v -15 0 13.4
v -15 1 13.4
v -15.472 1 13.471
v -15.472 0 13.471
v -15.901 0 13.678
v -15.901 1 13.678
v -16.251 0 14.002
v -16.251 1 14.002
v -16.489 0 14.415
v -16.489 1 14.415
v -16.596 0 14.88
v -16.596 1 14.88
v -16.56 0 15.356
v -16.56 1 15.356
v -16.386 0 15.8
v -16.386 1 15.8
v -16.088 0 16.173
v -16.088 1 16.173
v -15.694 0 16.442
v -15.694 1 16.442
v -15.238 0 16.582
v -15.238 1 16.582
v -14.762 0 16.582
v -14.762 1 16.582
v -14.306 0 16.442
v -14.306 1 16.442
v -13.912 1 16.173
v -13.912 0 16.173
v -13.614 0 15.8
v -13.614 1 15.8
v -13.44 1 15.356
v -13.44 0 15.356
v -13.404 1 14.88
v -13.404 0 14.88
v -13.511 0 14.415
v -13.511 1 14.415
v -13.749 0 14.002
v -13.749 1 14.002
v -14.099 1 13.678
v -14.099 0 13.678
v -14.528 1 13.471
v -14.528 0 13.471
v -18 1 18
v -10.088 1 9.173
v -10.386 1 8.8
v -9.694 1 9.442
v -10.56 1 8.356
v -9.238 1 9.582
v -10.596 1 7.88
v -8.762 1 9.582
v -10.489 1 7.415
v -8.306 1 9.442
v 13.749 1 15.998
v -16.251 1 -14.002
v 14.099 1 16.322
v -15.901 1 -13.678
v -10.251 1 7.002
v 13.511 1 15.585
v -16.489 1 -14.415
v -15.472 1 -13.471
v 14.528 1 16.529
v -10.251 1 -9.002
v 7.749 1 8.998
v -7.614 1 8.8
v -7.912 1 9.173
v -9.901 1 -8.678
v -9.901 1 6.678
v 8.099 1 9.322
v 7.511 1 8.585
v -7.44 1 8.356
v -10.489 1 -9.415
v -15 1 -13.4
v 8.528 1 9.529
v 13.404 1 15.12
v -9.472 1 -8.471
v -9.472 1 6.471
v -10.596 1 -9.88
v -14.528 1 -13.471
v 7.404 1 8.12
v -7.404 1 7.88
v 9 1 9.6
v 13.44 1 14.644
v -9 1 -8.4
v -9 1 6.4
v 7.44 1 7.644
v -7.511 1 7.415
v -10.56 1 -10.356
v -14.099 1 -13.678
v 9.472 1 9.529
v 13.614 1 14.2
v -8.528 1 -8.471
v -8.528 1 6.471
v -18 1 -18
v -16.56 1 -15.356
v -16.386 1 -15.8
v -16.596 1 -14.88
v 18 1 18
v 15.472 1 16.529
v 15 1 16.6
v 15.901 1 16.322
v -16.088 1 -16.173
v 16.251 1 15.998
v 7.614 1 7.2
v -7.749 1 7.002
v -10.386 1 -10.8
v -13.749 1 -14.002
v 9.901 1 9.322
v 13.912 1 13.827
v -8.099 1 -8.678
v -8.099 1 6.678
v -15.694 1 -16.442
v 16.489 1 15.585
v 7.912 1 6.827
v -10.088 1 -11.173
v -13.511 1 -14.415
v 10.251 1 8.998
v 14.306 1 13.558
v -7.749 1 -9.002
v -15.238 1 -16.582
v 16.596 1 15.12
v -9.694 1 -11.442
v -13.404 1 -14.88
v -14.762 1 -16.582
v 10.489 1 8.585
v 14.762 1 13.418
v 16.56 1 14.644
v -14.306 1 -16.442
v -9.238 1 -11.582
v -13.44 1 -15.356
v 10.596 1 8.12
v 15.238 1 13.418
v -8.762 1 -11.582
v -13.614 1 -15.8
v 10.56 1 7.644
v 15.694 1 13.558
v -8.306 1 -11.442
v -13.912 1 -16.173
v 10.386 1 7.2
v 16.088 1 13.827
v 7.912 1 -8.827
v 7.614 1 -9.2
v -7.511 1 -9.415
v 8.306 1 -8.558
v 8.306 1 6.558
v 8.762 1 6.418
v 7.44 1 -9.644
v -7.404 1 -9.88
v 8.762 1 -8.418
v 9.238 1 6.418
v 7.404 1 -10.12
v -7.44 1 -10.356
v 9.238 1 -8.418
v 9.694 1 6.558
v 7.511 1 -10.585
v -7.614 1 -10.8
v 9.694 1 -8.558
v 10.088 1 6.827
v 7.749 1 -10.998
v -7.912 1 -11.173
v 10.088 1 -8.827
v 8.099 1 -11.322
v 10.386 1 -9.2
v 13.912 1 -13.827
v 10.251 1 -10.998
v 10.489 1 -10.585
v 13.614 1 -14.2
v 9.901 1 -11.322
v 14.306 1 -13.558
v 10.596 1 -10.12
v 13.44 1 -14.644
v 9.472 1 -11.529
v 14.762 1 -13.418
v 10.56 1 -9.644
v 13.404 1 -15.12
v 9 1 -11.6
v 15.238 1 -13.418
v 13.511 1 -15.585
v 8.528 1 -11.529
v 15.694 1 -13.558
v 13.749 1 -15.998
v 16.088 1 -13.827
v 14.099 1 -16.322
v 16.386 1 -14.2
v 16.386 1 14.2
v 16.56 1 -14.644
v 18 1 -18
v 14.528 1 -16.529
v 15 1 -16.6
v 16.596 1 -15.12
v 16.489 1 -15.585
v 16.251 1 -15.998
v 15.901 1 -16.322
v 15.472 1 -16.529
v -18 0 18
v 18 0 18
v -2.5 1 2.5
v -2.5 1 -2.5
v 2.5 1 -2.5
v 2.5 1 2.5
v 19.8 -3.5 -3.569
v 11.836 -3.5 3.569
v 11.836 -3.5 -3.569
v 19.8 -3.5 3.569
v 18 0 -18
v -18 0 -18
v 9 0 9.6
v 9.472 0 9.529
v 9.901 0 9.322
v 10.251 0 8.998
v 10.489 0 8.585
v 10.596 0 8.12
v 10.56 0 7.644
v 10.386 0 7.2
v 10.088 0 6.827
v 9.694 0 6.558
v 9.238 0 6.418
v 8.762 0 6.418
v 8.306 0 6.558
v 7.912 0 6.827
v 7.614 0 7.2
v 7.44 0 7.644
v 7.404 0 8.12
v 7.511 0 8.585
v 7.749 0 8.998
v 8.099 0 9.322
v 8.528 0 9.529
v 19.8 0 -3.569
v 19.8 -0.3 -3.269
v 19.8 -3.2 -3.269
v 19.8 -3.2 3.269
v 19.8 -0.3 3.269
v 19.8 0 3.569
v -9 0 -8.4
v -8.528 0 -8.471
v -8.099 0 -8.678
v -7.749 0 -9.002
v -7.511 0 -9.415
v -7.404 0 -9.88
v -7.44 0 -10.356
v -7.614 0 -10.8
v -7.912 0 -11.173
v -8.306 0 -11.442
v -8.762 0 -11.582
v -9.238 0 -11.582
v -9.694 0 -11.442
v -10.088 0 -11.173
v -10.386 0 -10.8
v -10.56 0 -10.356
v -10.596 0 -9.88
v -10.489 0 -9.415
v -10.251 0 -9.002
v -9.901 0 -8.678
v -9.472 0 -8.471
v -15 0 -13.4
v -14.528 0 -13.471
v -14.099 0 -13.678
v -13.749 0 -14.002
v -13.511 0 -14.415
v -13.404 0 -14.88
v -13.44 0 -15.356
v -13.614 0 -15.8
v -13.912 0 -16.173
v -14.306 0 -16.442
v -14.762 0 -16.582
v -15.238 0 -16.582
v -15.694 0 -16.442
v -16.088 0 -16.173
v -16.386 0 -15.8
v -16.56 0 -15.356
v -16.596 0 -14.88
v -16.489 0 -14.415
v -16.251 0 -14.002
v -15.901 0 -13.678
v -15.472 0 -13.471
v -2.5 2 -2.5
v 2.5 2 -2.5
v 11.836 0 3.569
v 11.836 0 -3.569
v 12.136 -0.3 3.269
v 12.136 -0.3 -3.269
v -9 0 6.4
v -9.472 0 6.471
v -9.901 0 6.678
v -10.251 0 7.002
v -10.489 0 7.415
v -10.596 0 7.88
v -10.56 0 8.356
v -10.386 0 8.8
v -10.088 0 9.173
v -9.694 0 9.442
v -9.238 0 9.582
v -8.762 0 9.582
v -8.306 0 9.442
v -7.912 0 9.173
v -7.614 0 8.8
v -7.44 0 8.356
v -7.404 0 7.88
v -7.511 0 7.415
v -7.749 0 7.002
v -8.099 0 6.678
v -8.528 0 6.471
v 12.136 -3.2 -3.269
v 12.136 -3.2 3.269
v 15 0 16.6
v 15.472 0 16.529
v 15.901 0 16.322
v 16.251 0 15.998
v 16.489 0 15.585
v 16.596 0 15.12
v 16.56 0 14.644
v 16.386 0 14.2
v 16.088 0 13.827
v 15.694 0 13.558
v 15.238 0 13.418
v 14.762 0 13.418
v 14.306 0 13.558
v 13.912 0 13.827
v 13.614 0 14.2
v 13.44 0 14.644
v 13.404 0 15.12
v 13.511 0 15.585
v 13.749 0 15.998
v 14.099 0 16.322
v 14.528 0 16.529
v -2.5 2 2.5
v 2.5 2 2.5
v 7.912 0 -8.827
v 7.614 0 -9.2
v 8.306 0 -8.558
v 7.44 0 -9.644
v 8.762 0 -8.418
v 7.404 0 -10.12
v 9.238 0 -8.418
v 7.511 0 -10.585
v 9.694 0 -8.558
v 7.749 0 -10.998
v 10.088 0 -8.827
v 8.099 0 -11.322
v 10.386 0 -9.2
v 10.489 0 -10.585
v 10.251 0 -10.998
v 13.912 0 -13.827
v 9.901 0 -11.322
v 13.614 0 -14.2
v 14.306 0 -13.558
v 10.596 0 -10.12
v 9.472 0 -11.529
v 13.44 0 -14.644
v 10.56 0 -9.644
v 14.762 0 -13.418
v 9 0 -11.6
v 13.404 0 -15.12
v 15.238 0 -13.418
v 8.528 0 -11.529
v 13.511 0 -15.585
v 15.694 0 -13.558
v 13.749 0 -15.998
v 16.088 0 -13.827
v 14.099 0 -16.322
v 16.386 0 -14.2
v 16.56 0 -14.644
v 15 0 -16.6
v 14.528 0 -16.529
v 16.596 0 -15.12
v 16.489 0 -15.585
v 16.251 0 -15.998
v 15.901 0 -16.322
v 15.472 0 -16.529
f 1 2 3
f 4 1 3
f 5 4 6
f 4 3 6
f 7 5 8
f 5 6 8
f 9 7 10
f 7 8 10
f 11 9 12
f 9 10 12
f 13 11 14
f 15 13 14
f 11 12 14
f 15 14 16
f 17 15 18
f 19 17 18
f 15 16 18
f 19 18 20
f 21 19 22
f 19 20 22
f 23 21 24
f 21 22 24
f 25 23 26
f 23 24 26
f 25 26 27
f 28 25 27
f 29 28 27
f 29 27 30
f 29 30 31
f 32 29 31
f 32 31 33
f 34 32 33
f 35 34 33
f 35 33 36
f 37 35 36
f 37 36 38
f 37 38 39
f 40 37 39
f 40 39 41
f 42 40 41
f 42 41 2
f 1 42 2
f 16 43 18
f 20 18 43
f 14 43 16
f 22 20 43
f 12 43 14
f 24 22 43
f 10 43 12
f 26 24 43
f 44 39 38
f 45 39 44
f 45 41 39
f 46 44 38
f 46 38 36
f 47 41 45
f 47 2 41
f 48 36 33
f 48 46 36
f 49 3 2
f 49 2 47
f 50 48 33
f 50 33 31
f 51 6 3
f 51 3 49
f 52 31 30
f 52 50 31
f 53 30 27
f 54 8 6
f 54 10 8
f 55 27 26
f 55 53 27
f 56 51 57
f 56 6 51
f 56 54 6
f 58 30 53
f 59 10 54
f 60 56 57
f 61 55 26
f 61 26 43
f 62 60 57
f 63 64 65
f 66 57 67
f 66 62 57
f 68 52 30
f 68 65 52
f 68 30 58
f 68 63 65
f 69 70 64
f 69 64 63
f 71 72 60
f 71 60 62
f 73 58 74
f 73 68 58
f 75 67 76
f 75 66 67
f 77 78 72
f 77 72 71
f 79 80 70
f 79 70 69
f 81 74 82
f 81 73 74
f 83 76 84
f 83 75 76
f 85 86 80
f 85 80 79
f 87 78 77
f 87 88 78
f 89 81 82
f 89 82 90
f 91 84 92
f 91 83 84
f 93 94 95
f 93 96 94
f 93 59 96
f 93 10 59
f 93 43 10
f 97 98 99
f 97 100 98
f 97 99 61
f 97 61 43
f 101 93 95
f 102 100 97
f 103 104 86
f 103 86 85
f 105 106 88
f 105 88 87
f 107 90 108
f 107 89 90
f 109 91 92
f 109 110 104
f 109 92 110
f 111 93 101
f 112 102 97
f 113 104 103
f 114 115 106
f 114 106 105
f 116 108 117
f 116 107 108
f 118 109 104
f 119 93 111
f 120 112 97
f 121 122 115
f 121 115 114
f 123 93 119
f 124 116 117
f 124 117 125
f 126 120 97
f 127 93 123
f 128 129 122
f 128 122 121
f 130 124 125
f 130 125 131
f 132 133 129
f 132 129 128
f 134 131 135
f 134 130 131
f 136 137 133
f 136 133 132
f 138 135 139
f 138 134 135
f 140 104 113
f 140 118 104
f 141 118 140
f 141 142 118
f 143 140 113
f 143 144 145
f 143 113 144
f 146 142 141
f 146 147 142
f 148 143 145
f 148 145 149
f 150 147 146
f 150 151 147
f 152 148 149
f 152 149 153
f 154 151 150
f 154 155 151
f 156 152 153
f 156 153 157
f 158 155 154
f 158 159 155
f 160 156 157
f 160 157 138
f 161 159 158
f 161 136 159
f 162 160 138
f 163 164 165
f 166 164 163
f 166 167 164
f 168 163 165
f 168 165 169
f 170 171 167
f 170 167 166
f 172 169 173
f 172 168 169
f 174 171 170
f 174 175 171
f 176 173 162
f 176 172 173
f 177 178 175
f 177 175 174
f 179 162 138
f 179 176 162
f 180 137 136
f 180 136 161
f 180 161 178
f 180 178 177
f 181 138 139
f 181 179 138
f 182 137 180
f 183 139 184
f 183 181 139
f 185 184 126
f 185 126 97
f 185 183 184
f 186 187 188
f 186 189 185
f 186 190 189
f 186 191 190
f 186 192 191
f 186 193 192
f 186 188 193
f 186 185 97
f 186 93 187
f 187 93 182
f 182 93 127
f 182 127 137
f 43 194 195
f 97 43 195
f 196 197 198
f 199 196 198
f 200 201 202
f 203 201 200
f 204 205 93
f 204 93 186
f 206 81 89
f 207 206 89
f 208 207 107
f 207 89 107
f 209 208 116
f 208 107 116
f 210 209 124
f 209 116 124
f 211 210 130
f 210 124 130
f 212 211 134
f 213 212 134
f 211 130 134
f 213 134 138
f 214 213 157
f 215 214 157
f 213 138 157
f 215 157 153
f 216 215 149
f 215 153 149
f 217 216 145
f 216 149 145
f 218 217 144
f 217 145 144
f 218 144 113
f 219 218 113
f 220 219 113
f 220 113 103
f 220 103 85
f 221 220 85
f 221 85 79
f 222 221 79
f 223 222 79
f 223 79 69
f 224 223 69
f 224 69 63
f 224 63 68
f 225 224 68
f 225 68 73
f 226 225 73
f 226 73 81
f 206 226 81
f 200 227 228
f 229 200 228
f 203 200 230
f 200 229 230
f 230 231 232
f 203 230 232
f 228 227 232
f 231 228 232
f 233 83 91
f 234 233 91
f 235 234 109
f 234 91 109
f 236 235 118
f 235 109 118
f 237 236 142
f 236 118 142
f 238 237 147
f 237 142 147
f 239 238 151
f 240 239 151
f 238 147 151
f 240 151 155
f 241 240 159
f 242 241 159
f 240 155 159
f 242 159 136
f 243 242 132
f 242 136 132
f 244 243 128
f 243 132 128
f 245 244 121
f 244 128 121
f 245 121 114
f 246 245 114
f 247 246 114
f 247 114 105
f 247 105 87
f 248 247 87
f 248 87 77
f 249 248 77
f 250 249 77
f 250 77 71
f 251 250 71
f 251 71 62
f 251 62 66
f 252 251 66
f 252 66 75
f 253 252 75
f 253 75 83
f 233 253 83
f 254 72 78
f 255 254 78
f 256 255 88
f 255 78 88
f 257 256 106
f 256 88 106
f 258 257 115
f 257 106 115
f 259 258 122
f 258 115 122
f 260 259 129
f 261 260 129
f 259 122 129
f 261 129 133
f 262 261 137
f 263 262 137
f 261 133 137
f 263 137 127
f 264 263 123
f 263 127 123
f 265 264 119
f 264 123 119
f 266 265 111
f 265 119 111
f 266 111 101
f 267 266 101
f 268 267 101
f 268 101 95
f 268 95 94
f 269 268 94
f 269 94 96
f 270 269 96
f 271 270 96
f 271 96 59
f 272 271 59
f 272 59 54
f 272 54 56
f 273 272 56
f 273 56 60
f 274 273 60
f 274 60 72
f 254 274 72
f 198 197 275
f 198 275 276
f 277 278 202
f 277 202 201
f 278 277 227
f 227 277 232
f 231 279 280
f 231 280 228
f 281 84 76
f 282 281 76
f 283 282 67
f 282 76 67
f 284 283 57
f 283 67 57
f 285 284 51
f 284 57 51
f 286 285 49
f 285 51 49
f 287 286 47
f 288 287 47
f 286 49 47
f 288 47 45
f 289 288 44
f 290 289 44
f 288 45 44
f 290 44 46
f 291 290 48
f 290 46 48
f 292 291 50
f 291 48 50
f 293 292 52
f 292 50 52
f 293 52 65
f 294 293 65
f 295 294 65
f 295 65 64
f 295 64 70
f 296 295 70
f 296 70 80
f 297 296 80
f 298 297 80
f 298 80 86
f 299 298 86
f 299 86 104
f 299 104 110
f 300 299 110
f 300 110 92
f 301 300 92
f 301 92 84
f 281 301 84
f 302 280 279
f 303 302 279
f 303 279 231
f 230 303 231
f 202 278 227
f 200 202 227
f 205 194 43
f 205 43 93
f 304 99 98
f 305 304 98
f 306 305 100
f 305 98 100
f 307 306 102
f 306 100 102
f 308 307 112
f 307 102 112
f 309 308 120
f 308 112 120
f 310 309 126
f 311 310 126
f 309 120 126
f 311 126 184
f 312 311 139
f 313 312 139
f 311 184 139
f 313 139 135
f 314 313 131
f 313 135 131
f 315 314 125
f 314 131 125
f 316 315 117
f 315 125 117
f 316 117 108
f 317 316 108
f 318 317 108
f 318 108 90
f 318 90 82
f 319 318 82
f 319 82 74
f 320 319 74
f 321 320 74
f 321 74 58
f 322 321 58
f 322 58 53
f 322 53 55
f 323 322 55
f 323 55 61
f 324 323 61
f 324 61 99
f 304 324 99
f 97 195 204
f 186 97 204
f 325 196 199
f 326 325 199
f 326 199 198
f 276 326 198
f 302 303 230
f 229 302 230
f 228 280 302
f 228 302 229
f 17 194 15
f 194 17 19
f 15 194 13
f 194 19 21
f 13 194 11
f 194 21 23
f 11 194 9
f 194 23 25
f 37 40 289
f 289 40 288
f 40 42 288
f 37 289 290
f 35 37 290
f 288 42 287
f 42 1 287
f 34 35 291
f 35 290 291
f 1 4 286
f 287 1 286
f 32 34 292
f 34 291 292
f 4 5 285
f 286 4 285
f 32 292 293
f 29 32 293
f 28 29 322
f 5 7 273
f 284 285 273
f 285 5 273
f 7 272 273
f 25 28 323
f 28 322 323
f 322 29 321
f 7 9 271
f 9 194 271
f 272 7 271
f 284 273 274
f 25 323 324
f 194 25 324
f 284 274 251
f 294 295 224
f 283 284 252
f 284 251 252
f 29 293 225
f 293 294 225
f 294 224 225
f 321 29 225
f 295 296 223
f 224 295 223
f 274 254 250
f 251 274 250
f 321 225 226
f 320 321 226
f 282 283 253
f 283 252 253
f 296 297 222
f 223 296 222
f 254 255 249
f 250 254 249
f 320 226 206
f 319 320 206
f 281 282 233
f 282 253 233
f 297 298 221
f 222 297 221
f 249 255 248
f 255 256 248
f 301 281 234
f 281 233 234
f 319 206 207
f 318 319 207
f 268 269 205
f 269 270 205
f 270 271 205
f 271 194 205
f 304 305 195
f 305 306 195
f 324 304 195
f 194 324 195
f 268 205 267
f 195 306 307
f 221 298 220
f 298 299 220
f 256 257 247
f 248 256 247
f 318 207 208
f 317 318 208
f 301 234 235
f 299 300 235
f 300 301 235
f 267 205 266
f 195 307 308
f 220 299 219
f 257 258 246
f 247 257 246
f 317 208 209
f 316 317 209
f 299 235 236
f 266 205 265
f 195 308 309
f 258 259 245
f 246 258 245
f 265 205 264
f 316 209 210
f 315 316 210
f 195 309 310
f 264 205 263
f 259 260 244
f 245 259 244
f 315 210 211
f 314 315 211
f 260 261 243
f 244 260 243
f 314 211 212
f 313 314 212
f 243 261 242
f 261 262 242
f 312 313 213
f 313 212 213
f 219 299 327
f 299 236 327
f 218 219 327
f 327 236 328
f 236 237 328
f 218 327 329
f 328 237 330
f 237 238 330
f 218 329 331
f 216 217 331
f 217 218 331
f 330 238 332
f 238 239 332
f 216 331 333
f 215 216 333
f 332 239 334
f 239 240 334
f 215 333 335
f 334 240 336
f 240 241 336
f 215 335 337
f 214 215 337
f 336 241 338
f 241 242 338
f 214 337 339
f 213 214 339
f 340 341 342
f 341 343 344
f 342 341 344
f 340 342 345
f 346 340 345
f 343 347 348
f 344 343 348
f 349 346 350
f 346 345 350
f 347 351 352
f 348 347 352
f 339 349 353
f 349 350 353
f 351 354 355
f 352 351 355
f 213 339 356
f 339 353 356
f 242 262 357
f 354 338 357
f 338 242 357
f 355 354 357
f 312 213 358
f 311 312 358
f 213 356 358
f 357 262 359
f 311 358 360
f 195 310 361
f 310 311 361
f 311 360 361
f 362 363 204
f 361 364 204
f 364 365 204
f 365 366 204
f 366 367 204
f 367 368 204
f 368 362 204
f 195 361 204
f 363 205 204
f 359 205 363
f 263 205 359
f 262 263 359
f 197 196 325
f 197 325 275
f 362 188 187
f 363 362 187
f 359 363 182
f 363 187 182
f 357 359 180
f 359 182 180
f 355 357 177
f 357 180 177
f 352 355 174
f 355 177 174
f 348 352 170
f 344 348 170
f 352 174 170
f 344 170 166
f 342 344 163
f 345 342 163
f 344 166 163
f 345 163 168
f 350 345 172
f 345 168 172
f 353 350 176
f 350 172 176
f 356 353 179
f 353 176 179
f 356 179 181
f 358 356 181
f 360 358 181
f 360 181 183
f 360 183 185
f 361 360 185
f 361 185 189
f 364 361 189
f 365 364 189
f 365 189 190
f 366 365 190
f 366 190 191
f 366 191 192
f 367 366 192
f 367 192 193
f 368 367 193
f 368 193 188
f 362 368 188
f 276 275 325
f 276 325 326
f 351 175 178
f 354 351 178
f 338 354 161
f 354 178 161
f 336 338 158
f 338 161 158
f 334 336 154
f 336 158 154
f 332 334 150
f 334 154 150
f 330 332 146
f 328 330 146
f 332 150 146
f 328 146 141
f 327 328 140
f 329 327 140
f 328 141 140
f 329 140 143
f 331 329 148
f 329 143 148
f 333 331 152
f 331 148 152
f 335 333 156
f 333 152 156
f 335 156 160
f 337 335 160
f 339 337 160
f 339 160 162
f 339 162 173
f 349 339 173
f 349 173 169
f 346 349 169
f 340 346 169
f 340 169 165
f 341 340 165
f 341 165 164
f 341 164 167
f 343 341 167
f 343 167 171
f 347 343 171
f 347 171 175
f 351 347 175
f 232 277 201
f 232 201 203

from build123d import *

# Parameters (mm, degrees)
SKETCH1_W      = 36
SKETCH1_H      = 36
EXTRUDE1_DEPTH = 1
SKETCH2_R      = 1.6
EXTRUDE2_DEPTH = 26.475478406
SKETCH5_W      = 5
SKETCH5_H      = 5
EXTRUDE5_DEPTH = 1
SKETCH10_W     = 7.963574277
SKETCH10_H     = 7.13754315
EXTRUDE7_DEPTH = 3.5
SHELL1_T       = -0.3


with BuildPart() as part:
    # Sketch1 → Extrude1 (new body)
    with BuildSketch(Plane(origin=(0, 0, 0), x_dir=(1, 0, 0), z_dir=(0, 1, 0))):
        Rectangle(SKETCH1_W, SKETCH1_H)
    extrude(amount=EXTRUDE1_DEPTH)

    # Sketch2 → Extrude2 (cut, through all)
    with BuildSketch(Plane(origin=(0, 1, 0), x_dir=(1, 0, 0), z_dir=(0, 1, 0))):
        with Locations(Location((-15, 15, 0), (0, 0, 270))):
            Circle(SKETCH2_R)
        with Locations(Location((15, 15, 0), (0, 0, 90))):
            Circle(SKETCH2_R)
        with Locations(Location((15, -15, 0), (0, 0, 270))):
            Circle(SKETCH2_R)
        with Locations(Location((-15, -15, 0), (0, 0, 90))):
            Circle(SKETCH2_R)
        with Locations(Location((-9, 10, 0), (0, 0, 270))):
            Circle(SKETCH2_R)
        with Locations(Location((9, 10, 0), (0, 0, 90))):
            Circle(SKETCH2_R)
        with Locations(Location((9, -8, 0), (0, 0, 270))):
            Circle(SKETCH2_R)
        with Locations(Location((-9, -8, 0), (0, 0, 90))):
            Circle(SKETCH2_R)
    extrude(amount=-EXTRUDE2_DEPTH, mode=Mode.SUBTRACT)


with BuildPart() as body_2:
    # Sketch5 → Extrude5 (new body)
    with BuildSketch(Plane(origin=(0, 1, 0), x_dir=(1, 0, 0), z_dir=(0, 1, 0))):
        Rectangle(SKETCH5_W, SKETCH5_H)
    extrude(amount=EXTRUDE5_DEPTH)


with BuildPart() as body_3:
    # Sketch10 → Extrude7 (new body)
    with BuildSketch(Plane.XZ):
        with Locations((15.818212862, 0)):
            Rectangle(SKETCH10_W, SKETCH10_H)
    extrude(amount=EXTRUDE7_DEPTH)

    # Shell1
    shell1_openings = [body_3.faces().sort_by_distance(p)[0] for p in [
        (19.8, -1.75, 0),
    ]]
    offset(amount=SHELL1_T, openings=shell1_openings, kind=Kind.INTERSECTION)


solid = Compound([part.part, body_2.part, body_3.part])
